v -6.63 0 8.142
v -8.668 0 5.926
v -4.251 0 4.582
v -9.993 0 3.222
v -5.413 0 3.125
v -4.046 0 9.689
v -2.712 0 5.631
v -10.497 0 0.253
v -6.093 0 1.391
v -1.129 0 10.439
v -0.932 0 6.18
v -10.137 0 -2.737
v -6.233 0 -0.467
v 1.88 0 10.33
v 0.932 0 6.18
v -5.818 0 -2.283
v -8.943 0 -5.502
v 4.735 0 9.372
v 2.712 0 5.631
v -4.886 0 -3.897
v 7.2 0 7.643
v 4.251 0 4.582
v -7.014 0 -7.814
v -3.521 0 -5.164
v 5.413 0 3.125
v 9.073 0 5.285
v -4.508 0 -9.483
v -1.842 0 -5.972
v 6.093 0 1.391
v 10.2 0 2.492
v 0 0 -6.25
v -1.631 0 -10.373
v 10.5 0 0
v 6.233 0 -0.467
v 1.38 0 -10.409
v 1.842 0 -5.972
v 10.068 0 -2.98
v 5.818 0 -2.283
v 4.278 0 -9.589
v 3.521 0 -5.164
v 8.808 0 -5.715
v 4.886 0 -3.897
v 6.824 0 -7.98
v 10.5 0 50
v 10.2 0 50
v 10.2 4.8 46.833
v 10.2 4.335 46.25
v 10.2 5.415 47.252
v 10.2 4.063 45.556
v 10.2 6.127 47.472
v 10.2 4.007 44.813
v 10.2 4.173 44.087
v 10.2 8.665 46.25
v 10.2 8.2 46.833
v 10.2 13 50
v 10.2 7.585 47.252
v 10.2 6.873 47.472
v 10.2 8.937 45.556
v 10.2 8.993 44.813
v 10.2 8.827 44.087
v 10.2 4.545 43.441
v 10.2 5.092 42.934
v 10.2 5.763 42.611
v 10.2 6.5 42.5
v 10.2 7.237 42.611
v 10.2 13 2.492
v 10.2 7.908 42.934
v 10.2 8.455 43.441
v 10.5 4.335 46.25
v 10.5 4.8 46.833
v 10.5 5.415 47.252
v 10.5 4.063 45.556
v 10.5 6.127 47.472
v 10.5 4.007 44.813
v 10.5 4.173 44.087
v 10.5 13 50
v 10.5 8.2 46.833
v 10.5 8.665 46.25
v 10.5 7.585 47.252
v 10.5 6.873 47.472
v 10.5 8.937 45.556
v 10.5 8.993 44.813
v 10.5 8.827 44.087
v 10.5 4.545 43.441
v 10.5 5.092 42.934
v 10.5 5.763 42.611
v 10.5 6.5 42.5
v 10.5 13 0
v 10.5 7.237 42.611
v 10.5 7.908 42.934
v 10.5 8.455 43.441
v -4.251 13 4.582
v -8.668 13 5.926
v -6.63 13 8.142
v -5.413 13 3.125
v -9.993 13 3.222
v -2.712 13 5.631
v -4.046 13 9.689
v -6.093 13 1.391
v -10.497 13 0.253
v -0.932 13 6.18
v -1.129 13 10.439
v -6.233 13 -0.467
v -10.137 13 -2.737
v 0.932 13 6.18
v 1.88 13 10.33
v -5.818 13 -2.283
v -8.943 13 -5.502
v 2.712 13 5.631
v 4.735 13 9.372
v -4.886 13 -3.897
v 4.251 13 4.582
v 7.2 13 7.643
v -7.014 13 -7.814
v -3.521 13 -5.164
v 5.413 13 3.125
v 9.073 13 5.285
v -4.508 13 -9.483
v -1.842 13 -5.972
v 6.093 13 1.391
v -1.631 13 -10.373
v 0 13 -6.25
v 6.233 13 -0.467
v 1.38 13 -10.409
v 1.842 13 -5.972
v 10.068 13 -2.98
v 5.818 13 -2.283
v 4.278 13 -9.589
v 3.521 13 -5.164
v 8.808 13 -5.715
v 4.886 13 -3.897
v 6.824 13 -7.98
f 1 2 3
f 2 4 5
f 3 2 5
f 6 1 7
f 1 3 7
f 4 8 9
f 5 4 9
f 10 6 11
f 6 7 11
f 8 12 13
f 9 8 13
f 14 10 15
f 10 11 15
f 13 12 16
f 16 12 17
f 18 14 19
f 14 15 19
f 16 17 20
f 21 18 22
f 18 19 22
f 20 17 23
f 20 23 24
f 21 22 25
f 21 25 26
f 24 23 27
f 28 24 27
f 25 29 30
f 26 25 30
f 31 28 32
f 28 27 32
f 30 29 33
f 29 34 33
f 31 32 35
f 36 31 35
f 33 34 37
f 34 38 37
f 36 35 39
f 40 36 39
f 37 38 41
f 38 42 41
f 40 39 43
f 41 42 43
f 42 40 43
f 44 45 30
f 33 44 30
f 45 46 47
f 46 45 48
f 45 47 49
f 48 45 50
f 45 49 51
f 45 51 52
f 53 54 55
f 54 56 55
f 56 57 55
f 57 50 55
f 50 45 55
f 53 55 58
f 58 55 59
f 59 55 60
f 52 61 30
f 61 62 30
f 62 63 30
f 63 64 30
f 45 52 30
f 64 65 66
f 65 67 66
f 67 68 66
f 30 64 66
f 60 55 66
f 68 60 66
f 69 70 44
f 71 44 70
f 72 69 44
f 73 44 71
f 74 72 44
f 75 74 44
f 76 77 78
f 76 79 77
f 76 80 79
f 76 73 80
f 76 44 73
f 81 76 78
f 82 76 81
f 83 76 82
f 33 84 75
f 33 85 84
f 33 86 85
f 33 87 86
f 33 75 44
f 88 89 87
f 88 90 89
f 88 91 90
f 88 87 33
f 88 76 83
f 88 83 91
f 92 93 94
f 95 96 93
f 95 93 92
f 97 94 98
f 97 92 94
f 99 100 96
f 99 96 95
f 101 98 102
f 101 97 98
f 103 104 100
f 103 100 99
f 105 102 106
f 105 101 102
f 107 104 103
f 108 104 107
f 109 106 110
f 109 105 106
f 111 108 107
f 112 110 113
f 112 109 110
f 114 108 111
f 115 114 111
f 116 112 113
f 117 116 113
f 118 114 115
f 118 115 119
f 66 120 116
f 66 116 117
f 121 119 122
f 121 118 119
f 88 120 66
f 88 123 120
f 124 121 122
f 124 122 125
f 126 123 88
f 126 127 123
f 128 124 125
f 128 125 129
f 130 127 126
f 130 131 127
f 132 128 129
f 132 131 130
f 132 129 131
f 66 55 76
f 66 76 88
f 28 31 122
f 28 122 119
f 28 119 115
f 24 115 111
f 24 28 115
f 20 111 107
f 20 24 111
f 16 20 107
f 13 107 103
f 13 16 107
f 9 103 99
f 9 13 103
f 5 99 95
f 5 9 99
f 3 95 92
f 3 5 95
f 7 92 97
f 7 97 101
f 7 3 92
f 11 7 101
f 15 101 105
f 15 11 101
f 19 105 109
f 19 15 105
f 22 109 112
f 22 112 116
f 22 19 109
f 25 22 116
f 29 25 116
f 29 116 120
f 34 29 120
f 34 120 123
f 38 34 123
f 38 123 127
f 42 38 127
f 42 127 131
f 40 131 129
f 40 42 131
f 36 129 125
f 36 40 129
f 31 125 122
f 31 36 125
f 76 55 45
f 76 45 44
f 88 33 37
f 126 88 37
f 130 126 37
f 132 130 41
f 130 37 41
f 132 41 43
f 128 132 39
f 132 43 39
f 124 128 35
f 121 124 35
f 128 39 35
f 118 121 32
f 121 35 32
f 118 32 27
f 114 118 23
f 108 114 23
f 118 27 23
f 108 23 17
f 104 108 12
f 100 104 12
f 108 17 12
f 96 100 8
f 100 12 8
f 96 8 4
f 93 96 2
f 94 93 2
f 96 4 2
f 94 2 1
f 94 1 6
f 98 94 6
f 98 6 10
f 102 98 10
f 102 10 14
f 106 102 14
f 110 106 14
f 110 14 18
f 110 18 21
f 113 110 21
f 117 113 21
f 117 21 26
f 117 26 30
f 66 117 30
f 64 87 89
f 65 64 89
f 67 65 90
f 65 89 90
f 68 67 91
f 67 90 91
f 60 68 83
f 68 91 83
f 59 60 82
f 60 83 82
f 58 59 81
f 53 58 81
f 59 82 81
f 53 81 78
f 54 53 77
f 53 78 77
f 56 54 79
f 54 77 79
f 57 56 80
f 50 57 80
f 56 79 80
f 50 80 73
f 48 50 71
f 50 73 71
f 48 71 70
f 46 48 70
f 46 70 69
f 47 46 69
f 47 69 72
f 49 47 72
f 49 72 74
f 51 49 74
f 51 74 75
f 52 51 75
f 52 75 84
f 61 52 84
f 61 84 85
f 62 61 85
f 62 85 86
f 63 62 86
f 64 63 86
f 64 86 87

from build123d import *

# Parameters (mm, degrees)
SKETCH_1_R          = 10.5
SKETCH_1_R_2        = 6.25
EXTRUDE_1_DEPTH     = 13
SKETCH_2_W          = 0.3
SKETCH_2_H          = 50
EXTRUDE_2_DEPTH     = 13
SKETCH_3_R          = 2.5
CUT_EXTRUDE_1_DEPTH = 56.767373974


with BuildPart() as part:
    # 草图1 → 凸台-拉伸1 (new body)
    with BuildSketch(Plane(origin=(0, 0, 0), x_dir=(1, 0, 0), z_dir=(0, 1, 0))):
        with Locations(Location((0, 0, 0), (0, 0, 90))):
            Circle(SKETCH_1_R)
        with Locations(Location((0, 0, 0), (0, 0, 90))):
            Circle(SKETCH_1_R_2, mode=Mode.SUBTRACT)
    extrude(amount=EXTRUDE_1_DEPTH)

    # 草图2 → 凸台-拉伸2 (add)
    with BuildSketch(Plane(origin=(0, 13, 0), x_dir=(1, 0, 0), z_dir=(0, 1, 0))):
        with Locations((10.35, -25)):
            Rectangle(SKETCH_2_W, SKETCH_2_H)
    extrude(amount=-EXTRUDE_2_DEPTH)

    # 草图3 → 切除-拉伸1 (cut, through all)
    with BuildSketch(Plane(origin=(10.5, 0, 0), x_dir=(0, 0, -1), z_dir=(1, 0, 0))):
        with Locations((-45, 6.5)):
            Circle(SKETCH_3_R)
    extrude(amount=-CUT_EXTRUDE_1_DEPTH, mode=Mode.SUBTRACT)


solid = part.part
